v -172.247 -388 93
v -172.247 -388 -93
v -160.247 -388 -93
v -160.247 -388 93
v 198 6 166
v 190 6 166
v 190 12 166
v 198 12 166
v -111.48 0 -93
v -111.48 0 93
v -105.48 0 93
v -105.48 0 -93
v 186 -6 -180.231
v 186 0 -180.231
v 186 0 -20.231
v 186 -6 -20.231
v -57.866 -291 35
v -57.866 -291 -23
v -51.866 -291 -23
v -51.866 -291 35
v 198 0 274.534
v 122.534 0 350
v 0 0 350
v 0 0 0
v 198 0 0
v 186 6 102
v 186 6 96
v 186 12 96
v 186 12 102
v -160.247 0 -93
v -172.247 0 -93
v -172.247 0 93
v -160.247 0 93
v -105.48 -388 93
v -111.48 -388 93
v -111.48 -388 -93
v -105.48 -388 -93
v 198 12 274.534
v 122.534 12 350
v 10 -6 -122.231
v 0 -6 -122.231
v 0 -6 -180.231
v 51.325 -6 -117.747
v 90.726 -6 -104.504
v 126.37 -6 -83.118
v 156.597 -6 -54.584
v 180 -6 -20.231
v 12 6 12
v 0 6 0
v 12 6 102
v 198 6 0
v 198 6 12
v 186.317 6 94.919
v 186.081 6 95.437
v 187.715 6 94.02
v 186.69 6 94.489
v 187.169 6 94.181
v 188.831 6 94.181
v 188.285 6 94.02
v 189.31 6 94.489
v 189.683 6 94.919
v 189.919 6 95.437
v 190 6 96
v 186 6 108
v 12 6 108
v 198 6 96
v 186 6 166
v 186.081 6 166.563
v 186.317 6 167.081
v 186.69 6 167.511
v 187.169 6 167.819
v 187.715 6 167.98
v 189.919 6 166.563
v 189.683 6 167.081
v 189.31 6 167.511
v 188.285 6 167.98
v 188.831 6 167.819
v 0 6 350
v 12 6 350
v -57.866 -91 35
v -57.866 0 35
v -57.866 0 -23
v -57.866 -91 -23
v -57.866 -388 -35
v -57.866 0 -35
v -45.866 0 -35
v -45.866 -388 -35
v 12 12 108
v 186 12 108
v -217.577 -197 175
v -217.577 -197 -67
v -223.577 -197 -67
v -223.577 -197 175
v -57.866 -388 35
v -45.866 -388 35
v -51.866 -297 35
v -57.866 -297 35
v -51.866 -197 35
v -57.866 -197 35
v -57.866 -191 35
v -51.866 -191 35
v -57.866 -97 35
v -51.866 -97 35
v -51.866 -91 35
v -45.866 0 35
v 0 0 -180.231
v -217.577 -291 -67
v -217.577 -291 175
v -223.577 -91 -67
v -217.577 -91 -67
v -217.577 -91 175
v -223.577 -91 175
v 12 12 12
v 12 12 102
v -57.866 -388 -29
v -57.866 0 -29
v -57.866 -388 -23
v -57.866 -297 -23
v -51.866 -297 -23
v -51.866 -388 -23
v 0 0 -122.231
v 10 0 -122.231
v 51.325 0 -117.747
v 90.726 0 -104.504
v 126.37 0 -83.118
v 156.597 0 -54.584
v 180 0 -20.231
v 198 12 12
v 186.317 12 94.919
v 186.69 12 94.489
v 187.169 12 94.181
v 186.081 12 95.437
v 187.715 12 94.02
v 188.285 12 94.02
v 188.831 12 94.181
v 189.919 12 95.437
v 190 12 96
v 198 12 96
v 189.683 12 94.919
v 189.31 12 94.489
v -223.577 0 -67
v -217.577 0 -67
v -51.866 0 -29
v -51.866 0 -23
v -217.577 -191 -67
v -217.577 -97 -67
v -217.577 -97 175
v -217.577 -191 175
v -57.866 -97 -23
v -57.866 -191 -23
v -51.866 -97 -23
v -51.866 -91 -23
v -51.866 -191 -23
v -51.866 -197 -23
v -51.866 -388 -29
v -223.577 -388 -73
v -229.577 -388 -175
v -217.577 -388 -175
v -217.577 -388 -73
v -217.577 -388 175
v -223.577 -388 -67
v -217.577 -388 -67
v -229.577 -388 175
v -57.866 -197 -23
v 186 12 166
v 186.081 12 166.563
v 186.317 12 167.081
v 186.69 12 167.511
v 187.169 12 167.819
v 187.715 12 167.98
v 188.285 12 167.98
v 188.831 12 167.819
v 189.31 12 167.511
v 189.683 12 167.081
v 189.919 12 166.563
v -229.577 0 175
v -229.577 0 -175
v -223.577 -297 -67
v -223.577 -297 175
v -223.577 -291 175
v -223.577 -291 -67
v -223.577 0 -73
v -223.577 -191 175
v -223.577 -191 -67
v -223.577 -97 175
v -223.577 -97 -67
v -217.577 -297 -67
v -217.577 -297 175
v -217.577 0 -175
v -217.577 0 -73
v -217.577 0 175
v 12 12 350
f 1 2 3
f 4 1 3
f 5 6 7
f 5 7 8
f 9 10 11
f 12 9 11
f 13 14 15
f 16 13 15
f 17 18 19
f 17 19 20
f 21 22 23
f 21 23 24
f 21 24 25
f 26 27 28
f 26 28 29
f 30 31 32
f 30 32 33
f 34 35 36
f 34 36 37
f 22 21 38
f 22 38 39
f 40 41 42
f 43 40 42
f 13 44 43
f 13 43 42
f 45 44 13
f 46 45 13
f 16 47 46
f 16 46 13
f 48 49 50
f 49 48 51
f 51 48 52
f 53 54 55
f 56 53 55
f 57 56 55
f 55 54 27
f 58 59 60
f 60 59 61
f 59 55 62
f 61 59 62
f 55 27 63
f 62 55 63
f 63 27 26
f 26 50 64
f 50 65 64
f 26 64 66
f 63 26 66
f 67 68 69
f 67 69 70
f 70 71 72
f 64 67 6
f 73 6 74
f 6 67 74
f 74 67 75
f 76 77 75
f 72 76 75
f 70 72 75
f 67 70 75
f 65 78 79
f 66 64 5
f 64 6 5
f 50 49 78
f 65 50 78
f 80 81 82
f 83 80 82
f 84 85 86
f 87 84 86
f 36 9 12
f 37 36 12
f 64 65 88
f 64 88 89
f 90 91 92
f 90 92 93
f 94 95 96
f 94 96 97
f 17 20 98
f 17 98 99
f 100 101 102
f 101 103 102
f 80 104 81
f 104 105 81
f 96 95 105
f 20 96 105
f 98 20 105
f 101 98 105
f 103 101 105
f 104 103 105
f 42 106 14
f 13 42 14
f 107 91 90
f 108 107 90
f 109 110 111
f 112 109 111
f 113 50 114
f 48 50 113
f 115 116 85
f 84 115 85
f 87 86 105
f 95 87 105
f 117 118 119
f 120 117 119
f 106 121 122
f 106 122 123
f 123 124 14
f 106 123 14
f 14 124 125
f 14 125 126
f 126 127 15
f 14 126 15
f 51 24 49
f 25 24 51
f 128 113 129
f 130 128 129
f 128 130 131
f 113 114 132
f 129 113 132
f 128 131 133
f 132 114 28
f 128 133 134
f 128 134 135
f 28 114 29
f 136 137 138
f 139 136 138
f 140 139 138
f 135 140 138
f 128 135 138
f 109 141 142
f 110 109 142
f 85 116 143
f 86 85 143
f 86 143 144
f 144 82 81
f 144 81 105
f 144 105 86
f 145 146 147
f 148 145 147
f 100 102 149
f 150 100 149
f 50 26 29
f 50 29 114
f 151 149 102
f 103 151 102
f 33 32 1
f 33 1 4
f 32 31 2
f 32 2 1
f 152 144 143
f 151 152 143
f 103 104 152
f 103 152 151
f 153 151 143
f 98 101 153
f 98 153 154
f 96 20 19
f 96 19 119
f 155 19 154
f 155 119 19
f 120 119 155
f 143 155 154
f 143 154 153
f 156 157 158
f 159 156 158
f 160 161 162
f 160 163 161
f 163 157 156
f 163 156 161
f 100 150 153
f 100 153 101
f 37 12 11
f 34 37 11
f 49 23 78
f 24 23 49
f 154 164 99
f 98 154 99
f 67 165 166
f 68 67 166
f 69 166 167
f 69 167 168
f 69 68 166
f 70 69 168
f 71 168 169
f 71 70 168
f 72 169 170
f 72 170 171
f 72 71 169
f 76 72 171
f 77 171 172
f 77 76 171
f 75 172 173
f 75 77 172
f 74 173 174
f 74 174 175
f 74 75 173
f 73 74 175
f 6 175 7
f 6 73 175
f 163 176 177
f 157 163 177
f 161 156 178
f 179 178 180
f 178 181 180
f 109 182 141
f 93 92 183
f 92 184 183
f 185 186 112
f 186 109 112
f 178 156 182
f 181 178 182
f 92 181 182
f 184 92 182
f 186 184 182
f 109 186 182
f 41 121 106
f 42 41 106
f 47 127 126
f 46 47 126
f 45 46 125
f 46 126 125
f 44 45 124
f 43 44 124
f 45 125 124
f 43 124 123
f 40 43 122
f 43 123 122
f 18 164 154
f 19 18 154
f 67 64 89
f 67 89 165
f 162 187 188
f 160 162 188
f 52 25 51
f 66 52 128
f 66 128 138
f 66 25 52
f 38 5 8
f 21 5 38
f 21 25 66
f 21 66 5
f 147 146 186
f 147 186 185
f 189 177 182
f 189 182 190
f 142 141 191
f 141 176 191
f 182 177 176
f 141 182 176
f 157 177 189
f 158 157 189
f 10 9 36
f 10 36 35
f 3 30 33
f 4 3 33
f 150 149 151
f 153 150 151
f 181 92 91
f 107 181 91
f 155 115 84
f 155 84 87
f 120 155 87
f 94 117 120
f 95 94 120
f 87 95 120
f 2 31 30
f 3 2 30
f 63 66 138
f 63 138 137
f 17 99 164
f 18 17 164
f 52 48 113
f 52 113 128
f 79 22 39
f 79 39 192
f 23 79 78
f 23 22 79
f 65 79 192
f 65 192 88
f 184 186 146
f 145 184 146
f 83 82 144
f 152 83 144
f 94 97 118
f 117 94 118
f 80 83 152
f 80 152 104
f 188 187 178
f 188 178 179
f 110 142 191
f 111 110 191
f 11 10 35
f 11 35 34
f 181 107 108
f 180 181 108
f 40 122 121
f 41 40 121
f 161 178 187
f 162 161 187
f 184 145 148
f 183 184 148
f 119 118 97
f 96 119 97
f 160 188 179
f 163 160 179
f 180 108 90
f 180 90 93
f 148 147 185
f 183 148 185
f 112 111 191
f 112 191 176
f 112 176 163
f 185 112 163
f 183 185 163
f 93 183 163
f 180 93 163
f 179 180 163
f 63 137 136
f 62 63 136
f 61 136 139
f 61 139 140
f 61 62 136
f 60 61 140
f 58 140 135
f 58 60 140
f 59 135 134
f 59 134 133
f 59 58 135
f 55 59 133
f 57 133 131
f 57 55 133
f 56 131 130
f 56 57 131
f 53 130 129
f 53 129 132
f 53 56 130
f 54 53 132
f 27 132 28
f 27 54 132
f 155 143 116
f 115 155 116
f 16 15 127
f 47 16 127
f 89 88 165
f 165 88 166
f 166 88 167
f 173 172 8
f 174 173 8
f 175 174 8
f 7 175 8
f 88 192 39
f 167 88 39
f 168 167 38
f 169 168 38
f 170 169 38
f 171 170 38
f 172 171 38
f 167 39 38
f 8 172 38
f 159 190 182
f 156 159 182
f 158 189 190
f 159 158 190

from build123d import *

# Parameters (mm, degrees)
F4_DEPTH  = 6
F5_DEPTH  = 12
F7_DEPTH  = 388
F6_W      = 6
F6_H      = 186
F6_W_2    = 12
F8_W      = 6
F8_H      = 242
F9_DEPTH  = 6
F10_W     = 6
F10_H     = 58
F11_DEPTH = 6
F13_DEPTH = 6


with BuildPart() as f4:
    # F3 (on Front) → F4 (new body)
    with BuildSketch(Plane.XZ):
        with BuildLine():
            Line((0, 350), (0, 0))
            Line((0, 0), (198, 0))
            Line((198, 0), (198, 12))
            Line((198, 12), (12, 12))
            Line((12, 12), (12, 102))
            Line((12, 102), (186, 102))
            Line((186, 102), (186, 96))
            ThreePointArc((186, 96), (188, 94), (190, 96))
            Line((190, 96), (198, 96))
            Line((198, 96), (198, 166))
            Line((198, 166), (190, 166))
            ThreePointArc((190, 166), (188, 168), (186, 166))
            Line((186, 166), (186, 108))
            Line((186, 108), (12, 108))
            Line((12, 108), (12, 350))
            Line((12, 350), (0, 350))
        make_face()
    extrude(amount=-F4_DEPTH)

    # F3 (on Front) → F5 (join)
    with BuildSketch(Plane.XZ):
        with BuildLine():
            Line((122.5340546095, 350), (12, 350))
            Line((12, 350), (12, 108))
            Line((12, 108), (186, 108))
            Line((186, 108), (186, 166))
            ThreePointArc((186, 166), (188, 168), (190, 166))
            Line((190, 166), (198, 166))
            Line((198, 166), (198, 274.5340546095))
            Line((198, 274.5340546095), (122.5340546095, 350))
        make_face()
        with BuildLine():
            Line((12, 12), (198, 12))
            Line((198, 12), (198, 96))
            Line((198, 96), (190, 96))
            ThreePointArc((190, 96), (188, 94), (186, 96))
            Line((186, 96), (186, 102))
            Line((186, 102), (12, 102))
            Line((12, 102), (12, 12))
        make_face()
    extrude(amount=-F5_DEPTH)


with BuildPart() as f7:
    # F6 (on Front) → F7 (new body)
    with BuildSketch(Plane.XZ):
        Polygon((-45.8658916792, 35), (-57.8658916792, 35), (-57.8658916792, -23), (-51.8658916792, -23), (-51.8658916792, -29), (-57.8658916792, -29), (-57.8658916792, -35), (-45.8658916792, -35), align=None)
    extrude(amount=F7_DEPTH)

    # F10 (on face) → F11 (cut)
    with BuildSketch(Plane(origin=(-57.8658916792, 0, 0), x_dir=(0, -1, 0), z_dir=(-1, 0, 0))):
        with Locations((194, 6)):
            Rectangle(F10_W, F10_H)
        with Locations((294, 6)):
            Rectangle(F10_W, F10_H)
        with Locations((94, 6)):
            Rectangle(F10_W, F10_H)
    extrude(amount=-F11_DEPTH, mode=Mode.SUBTRACT)


with BuildPart() as f7b:
    # F6 (on Front) → F7, piece 2 (new body)
    with BuildSketch(Plane.XZ):
        with Locations((-108.4803044796, 0)):
            Rectangle(F6_W, F6_H)
    extrude(amount=F7_DEPTH)


with BuildPart() as f7c:
    # F6 (on Front) → F7, piece 3 (new body)
    with BuildSketch(Plane.XZ):
        Polygon((-229.5767990351, -175), (-217.5767990351, -175), (-217.5767990351, -73), (-223.5767990351, -73), (-223.5767990351, -67), (-217.5767990351, -67), (-217.5767990351, 175), (-229.5767990351, 175), align=None)
    extrude(amount=F7_DEPTH)

    # F8 (on face) → F9 (cut)
    with BuildSketch(Plane.YZ.offset(-217.5767990351)):
        with Locations((-194, 54)):
            Rectangle(F8_W, F8_H)
        with Locations((-294, 54)):
            Rectangle(F8_W, F8_H)
        with Locations((-94, 54)):
            Rectangle(F8_W, F8_H)
    extrude(amount=-F9_DEPTH, mode=Mode.SUBTRACT)


with BuildPart() as f7d:
    # F6 (on Front) → F7, piece 4 (new body)
    with BuildSketch(Plane.XZ):
        with Locations((-166.2473380566, 0)):
            Rectangle(F6_W_2, F6_H)
    extrude(amount=F7_DEPTH)


with BuildPart() as f13:
    # F12 (on Front) → F13 (new body)
    with BuildSketch(Plane.XZ):
        with BuildLine():
            Line((10, -122.2314518392), (0, -122.2314518392))
            Line((0, -122.2314518392), (0, -180.2314518392))
            Line((0, -180.2314518392), (186, -180.2314518392))
            Line((186, -180.2314518392), (186, -20.2314518392))
            Line((186, -20.2314518392), (180, -20.2314518392))
            ThreePointArc((180, -20.2314518392), (109.1261822124, -94.7750888598), (10, -122.2314518392))
        make_face()
    extrude(amount=F13_DEPTH)


solid = Compound([f4.part, f7.part, f7b.part, f7c.part, f7d.part, f13.part])
